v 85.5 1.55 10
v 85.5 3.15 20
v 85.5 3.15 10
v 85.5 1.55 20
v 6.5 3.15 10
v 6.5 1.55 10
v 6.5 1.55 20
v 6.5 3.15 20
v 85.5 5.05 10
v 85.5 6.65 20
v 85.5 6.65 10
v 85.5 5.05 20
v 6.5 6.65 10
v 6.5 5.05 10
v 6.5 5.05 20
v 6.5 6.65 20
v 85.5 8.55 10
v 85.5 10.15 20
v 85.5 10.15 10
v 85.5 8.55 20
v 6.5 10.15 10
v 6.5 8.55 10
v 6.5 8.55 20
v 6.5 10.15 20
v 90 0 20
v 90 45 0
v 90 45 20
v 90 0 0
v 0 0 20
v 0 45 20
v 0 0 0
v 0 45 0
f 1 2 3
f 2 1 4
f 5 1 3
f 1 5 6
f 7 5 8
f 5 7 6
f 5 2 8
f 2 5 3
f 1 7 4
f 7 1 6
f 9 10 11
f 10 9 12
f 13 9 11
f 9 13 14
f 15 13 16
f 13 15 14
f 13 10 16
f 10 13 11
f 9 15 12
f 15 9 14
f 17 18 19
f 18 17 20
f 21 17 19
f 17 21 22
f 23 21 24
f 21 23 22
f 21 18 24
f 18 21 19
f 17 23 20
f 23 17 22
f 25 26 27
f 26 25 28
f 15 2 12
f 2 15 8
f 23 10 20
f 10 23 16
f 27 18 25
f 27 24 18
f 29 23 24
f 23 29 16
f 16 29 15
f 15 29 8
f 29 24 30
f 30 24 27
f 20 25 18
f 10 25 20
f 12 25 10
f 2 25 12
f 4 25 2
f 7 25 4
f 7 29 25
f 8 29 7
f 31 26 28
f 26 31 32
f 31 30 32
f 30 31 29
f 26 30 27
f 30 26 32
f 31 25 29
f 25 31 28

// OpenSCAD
// Drying rack for 10 microscope slides
// Slide dimensions: 75 x 25 x 1 mm (L x W x T)
// Base dimensions: 90 x 45 x 20 mm (X x Y x Z)
// Slots: 10 parallel slots along X, 77 mm long, 1.6 mm wide, 10 mm deep
// Slot spacing: 3.5 mm centre-to-centre in Y
// Slots centred on block in X and Y

// Base dimensions
base_length = 90;   // X
base_width  = 45;   // Y
base_height = 20;   // Z

// Slot dimensions
num_slots    = 10;
slot_length  = 77;  // along X
slot_width   = 1.6; // along Y
slot_depth   = 10;  // along Z
slot_pitch   = 3.5; // centre-to-centre spacing in Y

// Calculate slot positions
// Total slot width + gaps: num_slots * slot_width + (num_slots - 1) * slot_pitch
// But we want slots centred, so we compute the total width occupied by slots and gaps
total_slot_width = num_slots * slot_width + (num_slots - 1) * slot_pitch;
// Offset from centre to first slot centre
first_slot_offset = -(total_slot_width - slot_width) / 2;

// Set resolution for curves
$fn = 64;

// Base block
module base_block() {
    cube([base_length, base_width, base_height]);
}

// Slot module
module slot() {
    // Slot runs along X, so extrude along X
    translate([0, 0, 0]) {
        cube([slot_length + 2, slot_width, slot_depth + 0.01]);
    }
}

// Build the rack
module drying_rack() {
    difference() {
        // Base block
        base_block();
        
        // Cut slots
        for (i = [0 : num_slots - 1]) {
            // Calculate Y position of each slot centre
            y_pos = first_slot_offset + i * slot_pitch + slot_width / 2;
            // Position slot: centred in X (base_length/2 - slot_length/2), at y_pos, at top (base_height - slot_depth)
            translate([
                (base_length - slot_length) / 2,
                y_pos - slot_width / 2,  // Adjust for slot width
                base_height - slot_depth
            ]) {
                slot();
            }
        }
    }
}

drying_rack();
